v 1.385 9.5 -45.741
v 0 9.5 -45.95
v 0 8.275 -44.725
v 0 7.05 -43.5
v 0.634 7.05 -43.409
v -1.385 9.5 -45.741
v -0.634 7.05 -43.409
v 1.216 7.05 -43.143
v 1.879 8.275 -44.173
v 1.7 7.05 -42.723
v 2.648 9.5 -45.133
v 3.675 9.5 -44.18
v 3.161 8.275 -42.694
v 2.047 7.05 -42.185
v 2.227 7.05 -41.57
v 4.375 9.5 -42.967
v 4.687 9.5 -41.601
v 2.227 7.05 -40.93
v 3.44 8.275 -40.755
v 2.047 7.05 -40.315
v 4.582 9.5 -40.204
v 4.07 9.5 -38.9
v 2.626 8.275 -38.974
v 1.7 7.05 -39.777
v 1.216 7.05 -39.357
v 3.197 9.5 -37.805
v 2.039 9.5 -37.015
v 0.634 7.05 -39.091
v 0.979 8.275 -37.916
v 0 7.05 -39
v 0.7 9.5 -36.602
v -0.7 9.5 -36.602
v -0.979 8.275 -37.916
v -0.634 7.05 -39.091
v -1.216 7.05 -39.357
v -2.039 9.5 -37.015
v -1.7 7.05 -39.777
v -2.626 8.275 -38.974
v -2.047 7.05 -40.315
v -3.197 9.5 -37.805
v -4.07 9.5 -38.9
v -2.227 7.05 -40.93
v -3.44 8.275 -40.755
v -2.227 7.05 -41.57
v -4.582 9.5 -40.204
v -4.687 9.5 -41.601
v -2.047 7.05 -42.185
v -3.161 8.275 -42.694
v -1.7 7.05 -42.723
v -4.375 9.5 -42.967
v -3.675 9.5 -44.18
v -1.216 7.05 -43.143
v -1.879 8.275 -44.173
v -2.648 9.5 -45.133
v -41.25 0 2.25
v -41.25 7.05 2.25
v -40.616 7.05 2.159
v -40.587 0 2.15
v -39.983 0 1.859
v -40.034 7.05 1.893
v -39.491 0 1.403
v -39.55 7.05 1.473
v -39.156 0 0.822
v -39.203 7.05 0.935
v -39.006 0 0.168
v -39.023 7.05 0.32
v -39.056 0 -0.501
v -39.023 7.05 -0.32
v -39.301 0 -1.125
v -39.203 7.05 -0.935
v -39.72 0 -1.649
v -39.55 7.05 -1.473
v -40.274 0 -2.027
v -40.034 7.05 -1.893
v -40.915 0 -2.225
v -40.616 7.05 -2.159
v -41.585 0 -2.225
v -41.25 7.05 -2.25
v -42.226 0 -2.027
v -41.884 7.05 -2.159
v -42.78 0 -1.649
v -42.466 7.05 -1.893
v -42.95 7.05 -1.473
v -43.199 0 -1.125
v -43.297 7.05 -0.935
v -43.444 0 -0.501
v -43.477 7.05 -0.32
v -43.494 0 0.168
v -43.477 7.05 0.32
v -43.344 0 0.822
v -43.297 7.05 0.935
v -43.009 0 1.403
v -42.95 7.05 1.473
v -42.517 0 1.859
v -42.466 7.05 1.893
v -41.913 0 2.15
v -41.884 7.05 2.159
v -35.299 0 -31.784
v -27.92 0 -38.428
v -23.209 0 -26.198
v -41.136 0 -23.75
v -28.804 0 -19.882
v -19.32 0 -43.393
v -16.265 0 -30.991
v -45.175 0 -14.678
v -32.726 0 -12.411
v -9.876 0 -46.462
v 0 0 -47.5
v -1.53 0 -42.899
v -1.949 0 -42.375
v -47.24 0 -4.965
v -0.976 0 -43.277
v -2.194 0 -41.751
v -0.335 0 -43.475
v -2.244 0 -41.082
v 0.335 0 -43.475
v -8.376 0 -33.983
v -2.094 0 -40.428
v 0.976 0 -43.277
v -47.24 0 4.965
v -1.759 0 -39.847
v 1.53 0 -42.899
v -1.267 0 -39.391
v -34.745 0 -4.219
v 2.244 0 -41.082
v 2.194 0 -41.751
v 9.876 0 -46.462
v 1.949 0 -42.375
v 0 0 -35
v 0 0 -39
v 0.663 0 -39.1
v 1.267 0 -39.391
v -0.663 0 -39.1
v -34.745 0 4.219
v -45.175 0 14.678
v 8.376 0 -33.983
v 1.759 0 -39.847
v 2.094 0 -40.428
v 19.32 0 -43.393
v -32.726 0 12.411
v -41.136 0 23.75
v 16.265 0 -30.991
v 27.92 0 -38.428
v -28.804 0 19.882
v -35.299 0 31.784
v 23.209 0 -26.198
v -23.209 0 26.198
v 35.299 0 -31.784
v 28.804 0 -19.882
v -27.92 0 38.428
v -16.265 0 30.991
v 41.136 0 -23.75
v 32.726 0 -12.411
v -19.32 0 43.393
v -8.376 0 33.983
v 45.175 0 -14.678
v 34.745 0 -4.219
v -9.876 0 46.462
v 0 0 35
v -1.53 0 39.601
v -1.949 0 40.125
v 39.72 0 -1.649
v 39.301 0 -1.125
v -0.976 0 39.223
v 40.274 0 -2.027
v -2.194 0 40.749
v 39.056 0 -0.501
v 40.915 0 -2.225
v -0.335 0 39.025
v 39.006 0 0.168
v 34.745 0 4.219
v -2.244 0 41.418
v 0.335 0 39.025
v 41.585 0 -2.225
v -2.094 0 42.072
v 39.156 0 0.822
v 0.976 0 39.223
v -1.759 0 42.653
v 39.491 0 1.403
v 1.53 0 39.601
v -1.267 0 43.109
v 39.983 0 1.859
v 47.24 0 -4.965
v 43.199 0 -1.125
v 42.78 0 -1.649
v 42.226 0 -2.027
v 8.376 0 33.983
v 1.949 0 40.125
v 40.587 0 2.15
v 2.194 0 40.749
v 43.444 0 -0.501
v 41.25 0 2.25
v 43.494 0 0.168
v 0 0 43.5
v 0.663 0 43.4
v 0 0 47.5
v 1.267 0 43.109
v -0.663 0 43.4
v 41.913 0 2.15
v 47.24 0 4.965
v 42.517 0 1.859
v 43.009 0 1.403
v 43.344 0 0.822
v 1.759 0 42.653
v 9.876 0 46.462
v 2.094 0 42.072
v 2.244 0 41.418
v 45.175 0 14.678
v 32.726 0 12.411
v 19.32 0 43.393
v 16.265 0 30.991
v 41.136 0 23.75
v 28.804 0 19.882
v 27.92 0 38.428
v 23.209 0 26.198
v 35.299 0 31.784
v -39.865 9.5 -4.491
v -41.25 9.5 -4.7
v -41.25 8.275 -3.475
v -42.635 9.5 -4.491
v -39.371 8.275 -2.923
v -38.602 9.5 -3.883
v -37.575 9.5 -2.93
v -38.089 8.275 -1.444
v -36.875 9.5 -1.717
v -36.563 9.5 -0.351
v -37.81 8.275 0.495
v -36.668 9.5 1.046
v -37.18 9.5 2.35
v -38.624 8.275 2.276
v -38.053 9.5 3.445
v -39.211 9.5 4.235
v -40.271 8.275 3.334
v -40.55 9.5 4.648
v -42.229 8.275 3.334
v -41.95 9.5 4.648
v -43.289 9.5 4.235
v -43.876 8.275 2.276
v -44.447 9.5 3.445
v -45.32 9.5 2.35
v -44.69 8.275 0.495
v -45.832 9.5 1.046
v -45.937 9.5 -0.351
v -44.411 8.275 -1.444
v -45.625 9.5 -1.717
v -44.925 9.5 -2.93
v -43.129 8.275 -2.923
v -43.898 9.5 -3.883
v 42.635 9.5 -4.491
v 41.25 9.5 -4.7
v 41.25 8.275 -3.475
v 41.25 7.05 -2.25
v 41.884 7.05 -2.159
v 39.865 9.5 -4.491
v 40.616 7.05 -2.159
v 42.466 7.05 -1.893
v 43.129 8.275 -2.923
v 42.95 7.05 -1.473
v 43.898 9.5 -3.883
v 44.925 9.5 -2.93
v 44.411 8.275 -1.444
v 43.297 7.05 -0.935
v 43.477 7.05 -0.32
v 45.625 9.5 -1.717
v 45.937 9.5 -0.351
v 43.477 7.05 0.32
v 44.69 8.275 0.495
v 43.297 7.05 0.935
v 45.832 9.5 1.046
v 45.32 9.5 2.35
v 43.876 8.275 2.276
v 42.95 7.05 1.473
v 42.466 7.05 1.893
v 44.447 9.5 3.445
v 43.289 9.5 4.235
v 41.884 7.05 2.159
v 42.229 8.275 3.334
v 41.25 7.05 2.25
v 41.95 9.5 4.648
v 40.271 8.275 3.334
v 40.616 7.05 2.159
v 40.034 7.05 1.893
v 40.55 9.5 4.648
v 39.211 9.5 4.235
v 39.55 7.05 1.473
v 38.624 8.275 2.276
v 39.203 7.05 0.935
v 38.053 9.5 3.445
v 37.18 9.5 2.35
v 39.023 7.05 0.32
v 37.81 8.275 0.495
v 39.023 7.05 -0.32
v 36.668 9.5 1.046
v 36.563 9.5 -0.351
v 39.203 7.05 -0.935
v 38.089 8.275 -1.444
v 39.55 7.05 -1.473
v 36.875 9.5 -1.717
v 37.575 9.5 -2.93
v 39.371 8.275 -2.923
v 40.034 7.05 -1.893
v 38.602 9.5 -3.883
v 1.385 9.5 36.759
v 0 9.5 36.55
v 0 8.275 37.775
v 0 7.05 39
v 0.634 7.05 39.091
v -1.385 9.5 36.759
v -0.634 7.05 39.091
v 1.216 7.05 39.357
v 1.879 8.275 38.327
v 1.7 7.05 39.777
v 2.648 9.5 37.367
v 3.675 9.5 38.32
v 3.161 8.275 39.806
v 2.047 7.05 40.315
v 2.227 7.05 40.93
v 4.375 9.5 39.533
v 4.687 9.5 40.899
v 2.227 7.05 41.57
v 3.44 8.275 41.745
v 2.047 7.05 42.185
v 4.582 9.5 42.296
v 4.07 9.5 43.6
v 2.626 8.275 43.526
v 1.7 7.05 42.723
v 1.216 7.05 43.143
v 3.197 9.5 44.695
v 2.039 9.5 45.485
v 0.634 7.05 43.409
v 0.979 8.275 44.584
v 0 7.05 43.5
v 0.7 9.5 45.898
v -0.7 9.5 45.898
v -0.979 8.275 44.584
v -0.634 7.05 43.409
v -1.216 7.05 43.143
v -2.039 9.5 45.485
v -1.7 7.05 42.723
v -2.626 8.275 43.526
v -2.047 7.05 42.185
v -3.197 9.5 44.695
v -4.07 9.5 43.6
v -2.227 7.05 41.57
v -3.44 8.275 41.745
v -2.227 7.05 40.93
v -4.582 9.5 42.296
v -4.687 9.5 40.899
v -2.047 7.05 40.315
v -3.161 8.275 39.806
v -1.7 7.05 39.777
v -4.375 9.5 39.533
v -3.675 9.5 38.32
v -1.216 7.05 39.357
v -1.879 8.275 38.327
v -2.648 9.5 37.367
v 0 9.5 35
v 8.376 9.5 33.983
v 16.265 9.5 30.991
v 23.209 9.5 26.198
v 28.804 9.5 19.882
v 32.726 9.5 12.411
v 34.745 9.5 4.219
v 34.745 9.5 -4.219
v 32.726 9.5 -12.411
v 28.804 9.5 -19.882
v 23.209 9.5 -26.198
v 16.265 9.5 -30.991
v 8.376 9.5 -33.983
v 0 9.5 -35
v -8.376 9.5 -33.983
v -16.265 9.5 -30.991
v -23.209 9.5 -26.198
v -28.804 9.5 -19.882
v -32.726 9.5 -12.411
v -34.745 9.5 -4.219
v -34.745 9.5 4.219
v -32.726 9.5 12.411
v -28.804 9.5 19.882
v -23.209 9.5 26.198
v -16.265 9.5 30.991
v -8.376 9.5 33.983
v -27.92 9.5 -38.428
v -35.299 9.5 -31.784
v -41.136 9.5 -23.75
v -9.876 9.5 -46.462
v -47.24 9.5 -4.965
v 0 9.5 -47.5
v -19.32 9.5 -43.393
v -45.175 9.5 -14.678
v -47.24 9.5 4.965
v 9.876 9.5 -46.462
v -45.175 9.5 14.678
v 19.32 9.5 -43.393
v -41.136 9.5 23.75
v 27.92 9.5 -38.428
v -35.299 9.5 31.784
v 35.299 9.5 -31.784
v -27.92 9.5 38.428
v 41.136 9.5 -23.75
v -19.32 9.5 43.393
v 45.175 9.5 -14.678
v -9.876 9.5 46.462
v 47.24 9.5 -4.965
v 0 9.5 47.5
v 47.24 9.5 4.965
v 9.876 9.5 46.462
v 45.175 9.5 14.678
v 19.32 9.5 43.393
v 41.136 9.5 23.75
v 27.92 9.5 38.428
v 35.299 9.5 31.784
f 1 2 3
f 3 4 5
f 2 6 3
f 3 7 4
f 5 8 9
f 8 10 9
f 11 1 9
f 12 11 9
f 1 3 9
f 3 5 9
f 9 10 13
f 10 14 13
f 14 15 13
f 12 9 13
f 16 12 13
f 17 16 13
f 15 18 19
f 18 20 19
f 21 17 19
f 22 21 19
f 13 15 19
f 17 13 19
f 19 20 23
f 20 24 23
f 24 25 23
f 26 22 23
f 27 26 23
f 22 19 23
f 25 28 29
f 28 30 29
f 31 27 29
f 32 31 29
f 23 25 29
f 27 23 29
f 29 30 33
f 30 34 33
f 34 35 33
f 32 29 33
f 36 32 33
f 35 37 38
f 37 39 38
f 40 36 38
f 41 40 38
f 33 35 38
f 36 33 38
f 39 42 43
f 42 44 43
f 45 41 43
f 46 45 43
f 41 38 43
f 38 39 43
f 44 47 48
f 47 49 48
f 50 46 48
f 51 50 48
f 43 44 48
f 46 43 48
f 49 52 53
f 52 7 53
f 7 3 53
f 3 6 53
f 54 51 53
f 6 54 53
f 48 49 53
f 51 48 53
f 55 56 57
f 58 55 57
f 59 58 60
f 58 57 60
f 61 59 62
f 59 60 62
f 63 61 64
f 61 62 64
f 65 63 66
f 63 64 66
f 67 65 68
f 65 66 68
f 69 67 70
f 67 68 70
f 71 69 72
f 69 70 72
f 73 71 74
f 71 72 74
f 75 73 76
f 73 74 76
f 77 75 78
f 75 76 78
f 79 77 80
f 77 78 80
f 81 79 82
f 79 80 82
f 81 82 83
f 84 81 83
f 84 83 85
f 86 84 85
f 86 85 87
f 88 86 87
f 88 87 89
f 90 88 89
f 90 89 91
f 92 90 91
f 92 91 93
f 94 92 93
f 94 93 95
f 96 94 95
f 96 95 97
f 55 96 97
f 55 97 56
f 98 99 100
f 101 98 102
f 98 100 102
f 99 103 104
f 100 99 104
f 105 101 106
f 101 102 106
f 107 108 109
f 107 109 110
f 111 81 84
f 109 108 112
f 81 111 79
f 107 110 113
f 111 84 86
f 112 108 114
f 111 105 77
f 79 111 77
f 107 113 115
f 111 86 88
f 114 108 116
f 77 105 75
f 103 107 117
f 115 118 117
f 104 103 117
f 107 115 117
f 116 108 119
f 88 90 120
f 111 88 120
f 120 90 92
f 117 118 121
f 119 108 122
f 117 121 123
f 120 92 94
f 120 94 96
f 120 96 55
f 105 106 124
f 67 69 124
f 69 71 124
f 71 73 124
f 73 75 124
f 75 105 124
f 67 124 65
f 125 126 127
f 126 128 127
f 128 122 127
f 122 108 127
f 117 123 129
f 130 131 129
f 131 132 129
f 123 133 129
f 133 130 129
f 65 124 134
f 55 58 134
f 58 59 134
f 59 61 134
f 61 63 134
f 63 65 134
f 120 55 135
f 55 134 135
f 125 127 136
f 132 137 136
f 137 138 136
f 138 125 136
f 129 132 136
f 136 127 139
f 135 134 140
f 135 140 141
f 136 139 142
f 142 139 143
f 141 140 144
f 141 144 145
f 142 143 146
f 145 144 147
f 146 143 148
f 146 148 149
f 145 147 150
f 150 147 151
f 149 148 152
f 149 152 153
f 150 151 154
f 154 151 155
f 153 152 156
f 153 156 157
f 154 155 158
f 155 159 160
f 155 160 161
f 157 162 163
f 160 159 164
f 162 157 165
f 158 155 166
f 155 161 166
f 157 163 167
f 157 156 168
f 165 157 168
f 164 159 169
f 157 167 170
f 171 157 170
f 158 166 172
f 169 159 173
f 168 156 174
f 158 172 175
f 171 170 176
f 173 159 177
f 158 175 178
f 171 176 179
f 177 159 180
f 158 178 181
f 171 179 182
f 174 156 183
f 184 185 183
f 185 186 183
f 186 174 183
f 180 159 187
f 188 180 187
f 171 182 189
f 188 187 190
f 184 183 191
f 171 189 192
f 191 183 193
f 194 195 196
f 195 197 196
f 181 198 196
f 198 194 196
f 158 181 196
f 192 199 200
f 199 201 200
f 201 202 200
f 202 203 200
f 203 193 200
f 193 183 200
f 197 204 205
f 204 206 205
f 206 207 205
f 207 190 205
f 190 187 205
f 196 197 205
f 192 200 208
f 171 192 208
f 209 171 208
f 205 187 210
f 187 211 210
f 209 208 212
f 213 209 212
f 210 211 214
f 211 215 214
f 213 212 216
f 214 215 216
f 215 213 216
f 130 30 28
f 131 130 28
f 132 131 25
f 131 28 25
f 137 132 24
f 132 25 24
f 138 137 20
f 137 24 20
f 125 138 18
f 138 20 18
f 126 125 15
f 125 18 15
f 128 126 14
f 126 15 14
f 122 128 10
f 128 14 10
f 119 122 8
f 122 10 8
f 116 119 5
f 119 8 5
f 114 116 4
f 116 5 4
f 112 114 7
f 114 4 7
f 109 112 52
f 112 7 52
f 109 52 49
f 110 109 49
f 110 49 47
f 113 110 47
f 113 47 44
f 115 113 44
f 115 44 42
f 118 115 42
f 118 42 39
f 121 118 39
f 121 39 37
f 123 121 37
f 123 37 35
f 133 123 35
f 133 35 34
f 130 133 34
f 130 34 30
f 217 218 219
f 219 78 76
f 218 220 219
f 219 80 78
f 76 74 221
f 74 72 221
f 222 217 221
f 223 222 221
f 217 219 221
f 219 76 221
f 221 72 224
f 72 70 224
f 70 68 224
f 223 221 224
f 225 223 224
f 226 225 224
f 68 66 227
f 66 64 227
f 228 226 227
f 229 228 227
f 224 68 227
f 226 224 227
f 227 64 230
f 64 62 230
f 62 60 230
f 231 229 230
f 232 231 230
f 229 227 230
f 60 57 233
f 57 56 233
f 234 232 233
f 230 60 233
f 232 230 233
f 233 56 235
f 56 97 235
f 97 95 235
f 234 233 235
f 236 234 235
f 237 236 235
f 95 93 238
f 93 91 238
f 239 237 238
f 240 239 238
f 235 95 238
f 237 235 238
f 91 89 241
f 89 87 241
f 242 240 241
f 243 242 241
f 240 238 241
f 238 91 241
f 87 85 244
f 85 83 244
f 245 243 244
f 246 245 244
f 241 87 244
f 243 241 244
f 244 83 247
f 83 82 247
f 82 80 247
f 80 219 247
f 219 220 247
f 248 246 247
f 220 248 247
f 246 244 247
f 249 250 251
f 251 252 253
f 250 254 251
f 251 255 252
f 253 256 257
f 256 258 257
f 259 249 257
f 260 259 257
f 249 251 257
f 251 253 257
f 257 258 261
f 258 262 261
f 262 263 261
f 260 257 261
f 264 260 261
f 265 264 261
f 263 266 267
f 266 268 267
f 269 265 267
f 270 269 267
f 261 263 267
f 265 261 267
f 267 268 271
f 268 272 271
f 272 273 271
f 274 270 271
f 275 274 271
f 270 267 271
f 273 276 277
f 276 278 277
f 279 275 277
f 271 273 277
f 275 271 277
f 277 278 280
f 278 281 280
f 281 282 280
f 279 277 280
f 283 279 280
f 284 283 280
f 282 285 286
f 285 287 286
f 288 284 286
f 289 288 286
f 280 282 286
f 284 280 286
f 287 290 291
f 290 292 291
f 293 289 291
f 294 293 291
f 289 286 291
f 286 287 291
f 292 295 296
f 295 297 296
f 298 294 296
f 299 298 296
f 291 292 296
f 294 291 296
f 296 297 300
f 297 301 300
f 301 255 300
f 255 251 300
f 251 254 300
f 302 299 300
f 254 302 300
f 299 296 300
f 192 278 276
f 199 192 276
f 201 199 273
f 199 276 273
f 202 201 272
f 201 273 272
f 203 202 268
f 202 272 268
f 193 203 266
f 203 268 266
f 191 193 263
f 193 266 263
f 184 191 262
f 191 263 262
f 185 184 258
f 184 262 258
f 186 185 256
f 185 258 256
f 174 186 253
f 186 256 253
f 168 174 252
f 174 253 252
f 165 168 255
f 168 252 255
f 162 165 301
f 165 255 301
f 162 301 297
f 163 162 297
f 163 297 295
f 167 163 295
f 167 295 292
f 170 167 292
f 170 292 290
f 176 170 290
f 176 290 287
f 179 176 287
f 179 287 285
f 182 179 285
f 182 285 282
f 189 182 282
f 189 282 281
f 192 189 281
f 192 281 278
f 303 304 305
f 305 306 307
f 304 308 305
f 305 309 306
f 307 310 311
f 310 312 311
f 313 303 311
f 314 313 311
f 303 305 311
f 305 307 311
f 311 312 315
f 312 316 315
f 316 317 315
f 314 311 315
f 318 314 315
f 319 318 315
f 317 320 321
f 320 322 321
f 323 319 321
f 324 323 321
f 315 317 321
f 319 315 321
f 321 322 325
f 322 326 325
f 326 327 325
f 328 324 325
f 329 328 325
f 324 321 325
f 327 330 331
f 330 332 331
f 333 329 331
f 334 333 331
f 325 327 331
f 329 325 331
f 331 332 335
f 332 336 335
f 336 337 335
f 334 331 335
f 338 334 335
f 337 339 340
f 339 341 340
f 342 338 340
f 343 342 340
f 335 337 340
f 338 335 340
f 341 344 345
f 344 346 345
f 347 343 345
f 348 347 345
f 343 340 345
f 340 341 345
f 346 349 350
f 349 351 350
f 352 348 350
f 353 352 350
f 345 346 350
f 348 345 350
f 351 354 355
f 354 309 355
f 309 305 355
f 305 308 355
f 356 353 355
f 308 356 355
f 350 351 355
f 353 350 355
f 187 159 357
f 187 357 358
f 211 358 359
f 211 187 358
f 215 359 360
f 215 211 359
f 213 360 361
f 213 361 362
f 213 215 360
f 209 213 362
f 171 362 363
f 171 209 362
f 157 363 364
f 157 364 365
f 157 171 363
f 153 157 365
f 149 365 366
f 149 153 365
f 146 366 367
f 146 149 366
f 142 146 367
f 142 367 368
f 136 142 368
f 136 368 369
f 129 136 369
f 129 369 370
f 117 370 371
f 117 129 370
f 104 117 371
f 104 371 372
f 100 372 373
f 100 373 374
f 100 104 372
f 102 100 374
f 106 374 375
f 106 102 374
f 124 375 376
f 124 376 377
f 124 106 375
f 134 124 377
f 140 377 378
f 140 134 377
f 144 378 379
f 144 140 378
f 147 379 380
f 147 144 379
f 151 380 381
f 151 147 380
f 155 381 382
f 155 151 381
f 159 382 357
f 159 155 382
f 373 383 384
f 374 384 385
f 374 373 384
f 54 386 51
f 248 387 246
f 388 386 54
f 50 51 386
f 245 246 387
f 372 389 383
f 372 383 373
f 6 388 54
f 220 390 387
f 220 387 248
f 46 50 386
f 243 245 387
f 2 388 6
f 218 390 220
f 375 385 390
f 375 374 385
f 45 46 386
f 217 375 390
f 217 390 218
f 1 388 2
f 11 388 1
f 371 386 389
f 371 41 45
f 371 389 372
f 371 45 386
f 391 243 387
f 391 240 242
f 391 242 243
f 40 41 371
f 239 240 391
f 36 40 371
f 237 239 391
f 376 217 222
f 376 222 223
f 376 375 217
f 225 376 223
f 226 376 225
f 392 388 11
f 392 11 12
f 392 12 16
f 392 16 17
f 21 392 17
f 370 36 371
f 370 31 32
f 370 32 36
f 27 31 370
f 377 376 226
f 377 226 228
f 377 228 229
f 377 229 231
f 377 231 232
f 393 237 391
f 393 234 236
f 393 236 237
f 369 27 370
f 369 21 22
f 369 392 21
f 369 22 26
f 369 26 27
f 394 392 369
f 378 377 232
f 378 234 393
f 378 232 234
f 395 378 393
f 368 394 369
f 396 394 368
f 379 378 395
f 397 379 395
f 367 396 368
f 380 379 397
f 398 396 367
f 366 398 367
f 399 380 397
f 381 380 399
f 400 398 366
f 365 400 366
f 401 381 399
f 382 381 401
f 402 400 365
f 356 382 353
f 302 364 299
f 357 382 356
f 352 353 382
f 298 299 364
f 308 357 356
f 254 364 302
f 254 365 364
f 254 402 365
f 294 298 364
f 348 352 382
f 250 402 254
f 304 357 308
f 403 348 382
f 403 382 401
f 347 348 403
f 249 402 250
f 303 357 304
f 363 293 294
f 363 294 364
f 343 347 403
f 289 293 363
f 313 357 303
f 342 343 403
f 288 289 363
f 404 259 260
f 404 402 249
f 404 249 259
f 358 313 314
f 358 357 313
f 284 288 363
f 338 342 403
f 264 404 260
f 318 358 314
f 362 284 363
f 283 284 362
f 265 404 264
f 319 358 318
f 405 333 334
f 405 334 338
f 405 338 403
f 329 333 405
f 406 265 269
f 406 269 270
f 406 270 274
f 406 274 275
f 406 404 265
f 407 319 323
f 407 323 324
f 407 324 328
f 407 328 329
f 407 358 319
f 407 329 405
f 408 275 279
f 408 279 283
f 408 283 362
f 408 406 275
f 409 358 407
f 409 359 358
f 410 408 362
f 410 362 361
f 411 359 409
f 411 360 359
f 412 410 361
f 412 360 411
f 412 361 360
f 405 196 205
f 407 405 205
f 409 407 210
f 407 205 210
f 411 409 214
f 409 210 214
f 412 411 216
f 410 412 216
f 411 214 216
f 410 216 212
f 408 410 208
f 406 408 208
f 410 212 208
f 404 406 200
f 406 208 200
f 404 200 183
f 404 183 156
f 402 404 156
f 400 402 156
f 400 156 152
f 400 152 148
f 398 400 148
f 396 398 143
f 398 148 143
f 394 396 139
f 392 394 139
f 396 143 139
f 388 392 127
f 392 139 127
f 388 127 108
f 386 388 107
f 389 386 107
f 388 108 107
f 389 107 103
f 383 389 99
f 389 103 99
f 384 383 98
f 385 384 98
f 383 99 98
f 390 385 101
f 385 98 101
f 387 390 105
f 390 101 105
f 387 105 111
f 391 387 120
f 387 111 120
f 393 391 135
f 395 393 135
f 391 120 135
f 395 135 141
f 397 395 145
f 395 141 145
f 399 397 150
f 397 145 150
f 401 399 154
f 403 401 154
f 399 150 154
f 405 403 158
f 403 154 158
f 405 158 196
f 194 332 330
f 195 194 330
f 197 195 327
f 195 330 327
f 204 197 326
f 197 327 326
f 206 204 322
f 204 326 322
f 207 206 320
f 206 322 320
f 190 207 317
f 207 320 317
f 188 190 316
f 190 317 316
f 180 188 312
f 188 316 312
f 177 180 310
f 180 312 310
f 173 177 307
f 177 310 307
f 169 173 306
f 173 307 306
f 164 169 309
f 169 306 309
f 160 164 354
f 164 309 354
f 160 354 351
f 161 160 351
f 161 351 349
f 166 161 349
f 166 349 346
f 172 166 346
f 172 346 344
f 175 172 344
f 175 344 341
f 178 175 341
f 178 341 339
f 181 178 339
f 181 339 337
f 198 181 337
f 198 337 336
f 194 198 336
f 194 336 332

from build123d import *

# Parameters (mm, degrees)
SKETCH1_R                                           = 47.5
SKETCH1_R_2                                         = 35
BOSS_EXTRUDE1_DEPTH                                 = 9.5
SKETCH2_R                                           = 2.25
CUT_EXTRUDE1_DEPTH                                  = 10
CSK_FOR_M4_COUNTERSUNK_FLAT_HEAD_SCREW1_D           = 4.5
CSK_FOR_M4_COUNTERSUNK_FLAT_HEAD_SCREW1_CSINK_D     = 9.4
CSK_FOR_M4_COUNTERSUNK_FLAT_HEAD_SCREW1_CSINK_ANGLE = 90


with BuildPart() as part:
    # Sketch1 → Boss-Extrude1 (new body)
    with BuildSketch(Plane(origin=(0, 0, 0), x_dir=(1, 0, 0), z_dir=(0, 1, 0))):
        with Locations(Location((0, 0, 0), (0, 0, 270))):
            Circle(SKETCH1_R)
        with Locations(Location((0, 0, 0), (0, 0, 270))):
            Circle(SKETCH1_R_2, mode=Mode.SUBTRACT)
    extrude(amount=BOSS_EXTRUDE1_DEPTH)

    # Sketch2 → Cut-Extrude1 (cut)
    with BuildSketch(Plane(origin=(0, 9.5, 0), x_dir=(1, 0, 0), z_dir=(0, 1, 0))):
        with Locations(Location((0, 41.25, 0), (0, 0, 270))):
            Circle(SKETCH2_R)
        with Locations(Location((41.25, 0, 0), (0, 0, 270))):
            Circle(SKETCH2_R)
        with Locations(Location((0, -41.25, 0), (0, 0, 270))):
            Circle(SKETCH2_R)
        with Locations(Location((-41.25, 0, 0), (0, 0, 270))):
            Circle(SKETCH2_R)
    extrude(amount=-CUT_EXTRUDE1_DEPTH, mode=Mode.SUBTRACT)

    # CSK for M4 Countersunk Flat Head Screw1 (through all)
    with Locations(Plane(origin=(0, 9.5, 41.25), x_dir=(0, 0, 1), z_dir=(0, 1, 0))):
        with Locations((0, 0), (-41.25, 41.25), (-82.5, 0), (-41.25, -41.25)):
            CounterSinkHole(CSK_FOR_M4_COUNTERSUNK_FLAT_HEAD_SCREW1_D / 2, CSK_FOR_M4_COUNTERSUNK_FLAT_HEAD_SCREW1_CSINK_D / 2, counter_sink_angle=CSK_FOR_M4_COUNTERSUNK_FLAT_HEAD_SCREW1_CSINK_ANGLE)


solid = part.part
